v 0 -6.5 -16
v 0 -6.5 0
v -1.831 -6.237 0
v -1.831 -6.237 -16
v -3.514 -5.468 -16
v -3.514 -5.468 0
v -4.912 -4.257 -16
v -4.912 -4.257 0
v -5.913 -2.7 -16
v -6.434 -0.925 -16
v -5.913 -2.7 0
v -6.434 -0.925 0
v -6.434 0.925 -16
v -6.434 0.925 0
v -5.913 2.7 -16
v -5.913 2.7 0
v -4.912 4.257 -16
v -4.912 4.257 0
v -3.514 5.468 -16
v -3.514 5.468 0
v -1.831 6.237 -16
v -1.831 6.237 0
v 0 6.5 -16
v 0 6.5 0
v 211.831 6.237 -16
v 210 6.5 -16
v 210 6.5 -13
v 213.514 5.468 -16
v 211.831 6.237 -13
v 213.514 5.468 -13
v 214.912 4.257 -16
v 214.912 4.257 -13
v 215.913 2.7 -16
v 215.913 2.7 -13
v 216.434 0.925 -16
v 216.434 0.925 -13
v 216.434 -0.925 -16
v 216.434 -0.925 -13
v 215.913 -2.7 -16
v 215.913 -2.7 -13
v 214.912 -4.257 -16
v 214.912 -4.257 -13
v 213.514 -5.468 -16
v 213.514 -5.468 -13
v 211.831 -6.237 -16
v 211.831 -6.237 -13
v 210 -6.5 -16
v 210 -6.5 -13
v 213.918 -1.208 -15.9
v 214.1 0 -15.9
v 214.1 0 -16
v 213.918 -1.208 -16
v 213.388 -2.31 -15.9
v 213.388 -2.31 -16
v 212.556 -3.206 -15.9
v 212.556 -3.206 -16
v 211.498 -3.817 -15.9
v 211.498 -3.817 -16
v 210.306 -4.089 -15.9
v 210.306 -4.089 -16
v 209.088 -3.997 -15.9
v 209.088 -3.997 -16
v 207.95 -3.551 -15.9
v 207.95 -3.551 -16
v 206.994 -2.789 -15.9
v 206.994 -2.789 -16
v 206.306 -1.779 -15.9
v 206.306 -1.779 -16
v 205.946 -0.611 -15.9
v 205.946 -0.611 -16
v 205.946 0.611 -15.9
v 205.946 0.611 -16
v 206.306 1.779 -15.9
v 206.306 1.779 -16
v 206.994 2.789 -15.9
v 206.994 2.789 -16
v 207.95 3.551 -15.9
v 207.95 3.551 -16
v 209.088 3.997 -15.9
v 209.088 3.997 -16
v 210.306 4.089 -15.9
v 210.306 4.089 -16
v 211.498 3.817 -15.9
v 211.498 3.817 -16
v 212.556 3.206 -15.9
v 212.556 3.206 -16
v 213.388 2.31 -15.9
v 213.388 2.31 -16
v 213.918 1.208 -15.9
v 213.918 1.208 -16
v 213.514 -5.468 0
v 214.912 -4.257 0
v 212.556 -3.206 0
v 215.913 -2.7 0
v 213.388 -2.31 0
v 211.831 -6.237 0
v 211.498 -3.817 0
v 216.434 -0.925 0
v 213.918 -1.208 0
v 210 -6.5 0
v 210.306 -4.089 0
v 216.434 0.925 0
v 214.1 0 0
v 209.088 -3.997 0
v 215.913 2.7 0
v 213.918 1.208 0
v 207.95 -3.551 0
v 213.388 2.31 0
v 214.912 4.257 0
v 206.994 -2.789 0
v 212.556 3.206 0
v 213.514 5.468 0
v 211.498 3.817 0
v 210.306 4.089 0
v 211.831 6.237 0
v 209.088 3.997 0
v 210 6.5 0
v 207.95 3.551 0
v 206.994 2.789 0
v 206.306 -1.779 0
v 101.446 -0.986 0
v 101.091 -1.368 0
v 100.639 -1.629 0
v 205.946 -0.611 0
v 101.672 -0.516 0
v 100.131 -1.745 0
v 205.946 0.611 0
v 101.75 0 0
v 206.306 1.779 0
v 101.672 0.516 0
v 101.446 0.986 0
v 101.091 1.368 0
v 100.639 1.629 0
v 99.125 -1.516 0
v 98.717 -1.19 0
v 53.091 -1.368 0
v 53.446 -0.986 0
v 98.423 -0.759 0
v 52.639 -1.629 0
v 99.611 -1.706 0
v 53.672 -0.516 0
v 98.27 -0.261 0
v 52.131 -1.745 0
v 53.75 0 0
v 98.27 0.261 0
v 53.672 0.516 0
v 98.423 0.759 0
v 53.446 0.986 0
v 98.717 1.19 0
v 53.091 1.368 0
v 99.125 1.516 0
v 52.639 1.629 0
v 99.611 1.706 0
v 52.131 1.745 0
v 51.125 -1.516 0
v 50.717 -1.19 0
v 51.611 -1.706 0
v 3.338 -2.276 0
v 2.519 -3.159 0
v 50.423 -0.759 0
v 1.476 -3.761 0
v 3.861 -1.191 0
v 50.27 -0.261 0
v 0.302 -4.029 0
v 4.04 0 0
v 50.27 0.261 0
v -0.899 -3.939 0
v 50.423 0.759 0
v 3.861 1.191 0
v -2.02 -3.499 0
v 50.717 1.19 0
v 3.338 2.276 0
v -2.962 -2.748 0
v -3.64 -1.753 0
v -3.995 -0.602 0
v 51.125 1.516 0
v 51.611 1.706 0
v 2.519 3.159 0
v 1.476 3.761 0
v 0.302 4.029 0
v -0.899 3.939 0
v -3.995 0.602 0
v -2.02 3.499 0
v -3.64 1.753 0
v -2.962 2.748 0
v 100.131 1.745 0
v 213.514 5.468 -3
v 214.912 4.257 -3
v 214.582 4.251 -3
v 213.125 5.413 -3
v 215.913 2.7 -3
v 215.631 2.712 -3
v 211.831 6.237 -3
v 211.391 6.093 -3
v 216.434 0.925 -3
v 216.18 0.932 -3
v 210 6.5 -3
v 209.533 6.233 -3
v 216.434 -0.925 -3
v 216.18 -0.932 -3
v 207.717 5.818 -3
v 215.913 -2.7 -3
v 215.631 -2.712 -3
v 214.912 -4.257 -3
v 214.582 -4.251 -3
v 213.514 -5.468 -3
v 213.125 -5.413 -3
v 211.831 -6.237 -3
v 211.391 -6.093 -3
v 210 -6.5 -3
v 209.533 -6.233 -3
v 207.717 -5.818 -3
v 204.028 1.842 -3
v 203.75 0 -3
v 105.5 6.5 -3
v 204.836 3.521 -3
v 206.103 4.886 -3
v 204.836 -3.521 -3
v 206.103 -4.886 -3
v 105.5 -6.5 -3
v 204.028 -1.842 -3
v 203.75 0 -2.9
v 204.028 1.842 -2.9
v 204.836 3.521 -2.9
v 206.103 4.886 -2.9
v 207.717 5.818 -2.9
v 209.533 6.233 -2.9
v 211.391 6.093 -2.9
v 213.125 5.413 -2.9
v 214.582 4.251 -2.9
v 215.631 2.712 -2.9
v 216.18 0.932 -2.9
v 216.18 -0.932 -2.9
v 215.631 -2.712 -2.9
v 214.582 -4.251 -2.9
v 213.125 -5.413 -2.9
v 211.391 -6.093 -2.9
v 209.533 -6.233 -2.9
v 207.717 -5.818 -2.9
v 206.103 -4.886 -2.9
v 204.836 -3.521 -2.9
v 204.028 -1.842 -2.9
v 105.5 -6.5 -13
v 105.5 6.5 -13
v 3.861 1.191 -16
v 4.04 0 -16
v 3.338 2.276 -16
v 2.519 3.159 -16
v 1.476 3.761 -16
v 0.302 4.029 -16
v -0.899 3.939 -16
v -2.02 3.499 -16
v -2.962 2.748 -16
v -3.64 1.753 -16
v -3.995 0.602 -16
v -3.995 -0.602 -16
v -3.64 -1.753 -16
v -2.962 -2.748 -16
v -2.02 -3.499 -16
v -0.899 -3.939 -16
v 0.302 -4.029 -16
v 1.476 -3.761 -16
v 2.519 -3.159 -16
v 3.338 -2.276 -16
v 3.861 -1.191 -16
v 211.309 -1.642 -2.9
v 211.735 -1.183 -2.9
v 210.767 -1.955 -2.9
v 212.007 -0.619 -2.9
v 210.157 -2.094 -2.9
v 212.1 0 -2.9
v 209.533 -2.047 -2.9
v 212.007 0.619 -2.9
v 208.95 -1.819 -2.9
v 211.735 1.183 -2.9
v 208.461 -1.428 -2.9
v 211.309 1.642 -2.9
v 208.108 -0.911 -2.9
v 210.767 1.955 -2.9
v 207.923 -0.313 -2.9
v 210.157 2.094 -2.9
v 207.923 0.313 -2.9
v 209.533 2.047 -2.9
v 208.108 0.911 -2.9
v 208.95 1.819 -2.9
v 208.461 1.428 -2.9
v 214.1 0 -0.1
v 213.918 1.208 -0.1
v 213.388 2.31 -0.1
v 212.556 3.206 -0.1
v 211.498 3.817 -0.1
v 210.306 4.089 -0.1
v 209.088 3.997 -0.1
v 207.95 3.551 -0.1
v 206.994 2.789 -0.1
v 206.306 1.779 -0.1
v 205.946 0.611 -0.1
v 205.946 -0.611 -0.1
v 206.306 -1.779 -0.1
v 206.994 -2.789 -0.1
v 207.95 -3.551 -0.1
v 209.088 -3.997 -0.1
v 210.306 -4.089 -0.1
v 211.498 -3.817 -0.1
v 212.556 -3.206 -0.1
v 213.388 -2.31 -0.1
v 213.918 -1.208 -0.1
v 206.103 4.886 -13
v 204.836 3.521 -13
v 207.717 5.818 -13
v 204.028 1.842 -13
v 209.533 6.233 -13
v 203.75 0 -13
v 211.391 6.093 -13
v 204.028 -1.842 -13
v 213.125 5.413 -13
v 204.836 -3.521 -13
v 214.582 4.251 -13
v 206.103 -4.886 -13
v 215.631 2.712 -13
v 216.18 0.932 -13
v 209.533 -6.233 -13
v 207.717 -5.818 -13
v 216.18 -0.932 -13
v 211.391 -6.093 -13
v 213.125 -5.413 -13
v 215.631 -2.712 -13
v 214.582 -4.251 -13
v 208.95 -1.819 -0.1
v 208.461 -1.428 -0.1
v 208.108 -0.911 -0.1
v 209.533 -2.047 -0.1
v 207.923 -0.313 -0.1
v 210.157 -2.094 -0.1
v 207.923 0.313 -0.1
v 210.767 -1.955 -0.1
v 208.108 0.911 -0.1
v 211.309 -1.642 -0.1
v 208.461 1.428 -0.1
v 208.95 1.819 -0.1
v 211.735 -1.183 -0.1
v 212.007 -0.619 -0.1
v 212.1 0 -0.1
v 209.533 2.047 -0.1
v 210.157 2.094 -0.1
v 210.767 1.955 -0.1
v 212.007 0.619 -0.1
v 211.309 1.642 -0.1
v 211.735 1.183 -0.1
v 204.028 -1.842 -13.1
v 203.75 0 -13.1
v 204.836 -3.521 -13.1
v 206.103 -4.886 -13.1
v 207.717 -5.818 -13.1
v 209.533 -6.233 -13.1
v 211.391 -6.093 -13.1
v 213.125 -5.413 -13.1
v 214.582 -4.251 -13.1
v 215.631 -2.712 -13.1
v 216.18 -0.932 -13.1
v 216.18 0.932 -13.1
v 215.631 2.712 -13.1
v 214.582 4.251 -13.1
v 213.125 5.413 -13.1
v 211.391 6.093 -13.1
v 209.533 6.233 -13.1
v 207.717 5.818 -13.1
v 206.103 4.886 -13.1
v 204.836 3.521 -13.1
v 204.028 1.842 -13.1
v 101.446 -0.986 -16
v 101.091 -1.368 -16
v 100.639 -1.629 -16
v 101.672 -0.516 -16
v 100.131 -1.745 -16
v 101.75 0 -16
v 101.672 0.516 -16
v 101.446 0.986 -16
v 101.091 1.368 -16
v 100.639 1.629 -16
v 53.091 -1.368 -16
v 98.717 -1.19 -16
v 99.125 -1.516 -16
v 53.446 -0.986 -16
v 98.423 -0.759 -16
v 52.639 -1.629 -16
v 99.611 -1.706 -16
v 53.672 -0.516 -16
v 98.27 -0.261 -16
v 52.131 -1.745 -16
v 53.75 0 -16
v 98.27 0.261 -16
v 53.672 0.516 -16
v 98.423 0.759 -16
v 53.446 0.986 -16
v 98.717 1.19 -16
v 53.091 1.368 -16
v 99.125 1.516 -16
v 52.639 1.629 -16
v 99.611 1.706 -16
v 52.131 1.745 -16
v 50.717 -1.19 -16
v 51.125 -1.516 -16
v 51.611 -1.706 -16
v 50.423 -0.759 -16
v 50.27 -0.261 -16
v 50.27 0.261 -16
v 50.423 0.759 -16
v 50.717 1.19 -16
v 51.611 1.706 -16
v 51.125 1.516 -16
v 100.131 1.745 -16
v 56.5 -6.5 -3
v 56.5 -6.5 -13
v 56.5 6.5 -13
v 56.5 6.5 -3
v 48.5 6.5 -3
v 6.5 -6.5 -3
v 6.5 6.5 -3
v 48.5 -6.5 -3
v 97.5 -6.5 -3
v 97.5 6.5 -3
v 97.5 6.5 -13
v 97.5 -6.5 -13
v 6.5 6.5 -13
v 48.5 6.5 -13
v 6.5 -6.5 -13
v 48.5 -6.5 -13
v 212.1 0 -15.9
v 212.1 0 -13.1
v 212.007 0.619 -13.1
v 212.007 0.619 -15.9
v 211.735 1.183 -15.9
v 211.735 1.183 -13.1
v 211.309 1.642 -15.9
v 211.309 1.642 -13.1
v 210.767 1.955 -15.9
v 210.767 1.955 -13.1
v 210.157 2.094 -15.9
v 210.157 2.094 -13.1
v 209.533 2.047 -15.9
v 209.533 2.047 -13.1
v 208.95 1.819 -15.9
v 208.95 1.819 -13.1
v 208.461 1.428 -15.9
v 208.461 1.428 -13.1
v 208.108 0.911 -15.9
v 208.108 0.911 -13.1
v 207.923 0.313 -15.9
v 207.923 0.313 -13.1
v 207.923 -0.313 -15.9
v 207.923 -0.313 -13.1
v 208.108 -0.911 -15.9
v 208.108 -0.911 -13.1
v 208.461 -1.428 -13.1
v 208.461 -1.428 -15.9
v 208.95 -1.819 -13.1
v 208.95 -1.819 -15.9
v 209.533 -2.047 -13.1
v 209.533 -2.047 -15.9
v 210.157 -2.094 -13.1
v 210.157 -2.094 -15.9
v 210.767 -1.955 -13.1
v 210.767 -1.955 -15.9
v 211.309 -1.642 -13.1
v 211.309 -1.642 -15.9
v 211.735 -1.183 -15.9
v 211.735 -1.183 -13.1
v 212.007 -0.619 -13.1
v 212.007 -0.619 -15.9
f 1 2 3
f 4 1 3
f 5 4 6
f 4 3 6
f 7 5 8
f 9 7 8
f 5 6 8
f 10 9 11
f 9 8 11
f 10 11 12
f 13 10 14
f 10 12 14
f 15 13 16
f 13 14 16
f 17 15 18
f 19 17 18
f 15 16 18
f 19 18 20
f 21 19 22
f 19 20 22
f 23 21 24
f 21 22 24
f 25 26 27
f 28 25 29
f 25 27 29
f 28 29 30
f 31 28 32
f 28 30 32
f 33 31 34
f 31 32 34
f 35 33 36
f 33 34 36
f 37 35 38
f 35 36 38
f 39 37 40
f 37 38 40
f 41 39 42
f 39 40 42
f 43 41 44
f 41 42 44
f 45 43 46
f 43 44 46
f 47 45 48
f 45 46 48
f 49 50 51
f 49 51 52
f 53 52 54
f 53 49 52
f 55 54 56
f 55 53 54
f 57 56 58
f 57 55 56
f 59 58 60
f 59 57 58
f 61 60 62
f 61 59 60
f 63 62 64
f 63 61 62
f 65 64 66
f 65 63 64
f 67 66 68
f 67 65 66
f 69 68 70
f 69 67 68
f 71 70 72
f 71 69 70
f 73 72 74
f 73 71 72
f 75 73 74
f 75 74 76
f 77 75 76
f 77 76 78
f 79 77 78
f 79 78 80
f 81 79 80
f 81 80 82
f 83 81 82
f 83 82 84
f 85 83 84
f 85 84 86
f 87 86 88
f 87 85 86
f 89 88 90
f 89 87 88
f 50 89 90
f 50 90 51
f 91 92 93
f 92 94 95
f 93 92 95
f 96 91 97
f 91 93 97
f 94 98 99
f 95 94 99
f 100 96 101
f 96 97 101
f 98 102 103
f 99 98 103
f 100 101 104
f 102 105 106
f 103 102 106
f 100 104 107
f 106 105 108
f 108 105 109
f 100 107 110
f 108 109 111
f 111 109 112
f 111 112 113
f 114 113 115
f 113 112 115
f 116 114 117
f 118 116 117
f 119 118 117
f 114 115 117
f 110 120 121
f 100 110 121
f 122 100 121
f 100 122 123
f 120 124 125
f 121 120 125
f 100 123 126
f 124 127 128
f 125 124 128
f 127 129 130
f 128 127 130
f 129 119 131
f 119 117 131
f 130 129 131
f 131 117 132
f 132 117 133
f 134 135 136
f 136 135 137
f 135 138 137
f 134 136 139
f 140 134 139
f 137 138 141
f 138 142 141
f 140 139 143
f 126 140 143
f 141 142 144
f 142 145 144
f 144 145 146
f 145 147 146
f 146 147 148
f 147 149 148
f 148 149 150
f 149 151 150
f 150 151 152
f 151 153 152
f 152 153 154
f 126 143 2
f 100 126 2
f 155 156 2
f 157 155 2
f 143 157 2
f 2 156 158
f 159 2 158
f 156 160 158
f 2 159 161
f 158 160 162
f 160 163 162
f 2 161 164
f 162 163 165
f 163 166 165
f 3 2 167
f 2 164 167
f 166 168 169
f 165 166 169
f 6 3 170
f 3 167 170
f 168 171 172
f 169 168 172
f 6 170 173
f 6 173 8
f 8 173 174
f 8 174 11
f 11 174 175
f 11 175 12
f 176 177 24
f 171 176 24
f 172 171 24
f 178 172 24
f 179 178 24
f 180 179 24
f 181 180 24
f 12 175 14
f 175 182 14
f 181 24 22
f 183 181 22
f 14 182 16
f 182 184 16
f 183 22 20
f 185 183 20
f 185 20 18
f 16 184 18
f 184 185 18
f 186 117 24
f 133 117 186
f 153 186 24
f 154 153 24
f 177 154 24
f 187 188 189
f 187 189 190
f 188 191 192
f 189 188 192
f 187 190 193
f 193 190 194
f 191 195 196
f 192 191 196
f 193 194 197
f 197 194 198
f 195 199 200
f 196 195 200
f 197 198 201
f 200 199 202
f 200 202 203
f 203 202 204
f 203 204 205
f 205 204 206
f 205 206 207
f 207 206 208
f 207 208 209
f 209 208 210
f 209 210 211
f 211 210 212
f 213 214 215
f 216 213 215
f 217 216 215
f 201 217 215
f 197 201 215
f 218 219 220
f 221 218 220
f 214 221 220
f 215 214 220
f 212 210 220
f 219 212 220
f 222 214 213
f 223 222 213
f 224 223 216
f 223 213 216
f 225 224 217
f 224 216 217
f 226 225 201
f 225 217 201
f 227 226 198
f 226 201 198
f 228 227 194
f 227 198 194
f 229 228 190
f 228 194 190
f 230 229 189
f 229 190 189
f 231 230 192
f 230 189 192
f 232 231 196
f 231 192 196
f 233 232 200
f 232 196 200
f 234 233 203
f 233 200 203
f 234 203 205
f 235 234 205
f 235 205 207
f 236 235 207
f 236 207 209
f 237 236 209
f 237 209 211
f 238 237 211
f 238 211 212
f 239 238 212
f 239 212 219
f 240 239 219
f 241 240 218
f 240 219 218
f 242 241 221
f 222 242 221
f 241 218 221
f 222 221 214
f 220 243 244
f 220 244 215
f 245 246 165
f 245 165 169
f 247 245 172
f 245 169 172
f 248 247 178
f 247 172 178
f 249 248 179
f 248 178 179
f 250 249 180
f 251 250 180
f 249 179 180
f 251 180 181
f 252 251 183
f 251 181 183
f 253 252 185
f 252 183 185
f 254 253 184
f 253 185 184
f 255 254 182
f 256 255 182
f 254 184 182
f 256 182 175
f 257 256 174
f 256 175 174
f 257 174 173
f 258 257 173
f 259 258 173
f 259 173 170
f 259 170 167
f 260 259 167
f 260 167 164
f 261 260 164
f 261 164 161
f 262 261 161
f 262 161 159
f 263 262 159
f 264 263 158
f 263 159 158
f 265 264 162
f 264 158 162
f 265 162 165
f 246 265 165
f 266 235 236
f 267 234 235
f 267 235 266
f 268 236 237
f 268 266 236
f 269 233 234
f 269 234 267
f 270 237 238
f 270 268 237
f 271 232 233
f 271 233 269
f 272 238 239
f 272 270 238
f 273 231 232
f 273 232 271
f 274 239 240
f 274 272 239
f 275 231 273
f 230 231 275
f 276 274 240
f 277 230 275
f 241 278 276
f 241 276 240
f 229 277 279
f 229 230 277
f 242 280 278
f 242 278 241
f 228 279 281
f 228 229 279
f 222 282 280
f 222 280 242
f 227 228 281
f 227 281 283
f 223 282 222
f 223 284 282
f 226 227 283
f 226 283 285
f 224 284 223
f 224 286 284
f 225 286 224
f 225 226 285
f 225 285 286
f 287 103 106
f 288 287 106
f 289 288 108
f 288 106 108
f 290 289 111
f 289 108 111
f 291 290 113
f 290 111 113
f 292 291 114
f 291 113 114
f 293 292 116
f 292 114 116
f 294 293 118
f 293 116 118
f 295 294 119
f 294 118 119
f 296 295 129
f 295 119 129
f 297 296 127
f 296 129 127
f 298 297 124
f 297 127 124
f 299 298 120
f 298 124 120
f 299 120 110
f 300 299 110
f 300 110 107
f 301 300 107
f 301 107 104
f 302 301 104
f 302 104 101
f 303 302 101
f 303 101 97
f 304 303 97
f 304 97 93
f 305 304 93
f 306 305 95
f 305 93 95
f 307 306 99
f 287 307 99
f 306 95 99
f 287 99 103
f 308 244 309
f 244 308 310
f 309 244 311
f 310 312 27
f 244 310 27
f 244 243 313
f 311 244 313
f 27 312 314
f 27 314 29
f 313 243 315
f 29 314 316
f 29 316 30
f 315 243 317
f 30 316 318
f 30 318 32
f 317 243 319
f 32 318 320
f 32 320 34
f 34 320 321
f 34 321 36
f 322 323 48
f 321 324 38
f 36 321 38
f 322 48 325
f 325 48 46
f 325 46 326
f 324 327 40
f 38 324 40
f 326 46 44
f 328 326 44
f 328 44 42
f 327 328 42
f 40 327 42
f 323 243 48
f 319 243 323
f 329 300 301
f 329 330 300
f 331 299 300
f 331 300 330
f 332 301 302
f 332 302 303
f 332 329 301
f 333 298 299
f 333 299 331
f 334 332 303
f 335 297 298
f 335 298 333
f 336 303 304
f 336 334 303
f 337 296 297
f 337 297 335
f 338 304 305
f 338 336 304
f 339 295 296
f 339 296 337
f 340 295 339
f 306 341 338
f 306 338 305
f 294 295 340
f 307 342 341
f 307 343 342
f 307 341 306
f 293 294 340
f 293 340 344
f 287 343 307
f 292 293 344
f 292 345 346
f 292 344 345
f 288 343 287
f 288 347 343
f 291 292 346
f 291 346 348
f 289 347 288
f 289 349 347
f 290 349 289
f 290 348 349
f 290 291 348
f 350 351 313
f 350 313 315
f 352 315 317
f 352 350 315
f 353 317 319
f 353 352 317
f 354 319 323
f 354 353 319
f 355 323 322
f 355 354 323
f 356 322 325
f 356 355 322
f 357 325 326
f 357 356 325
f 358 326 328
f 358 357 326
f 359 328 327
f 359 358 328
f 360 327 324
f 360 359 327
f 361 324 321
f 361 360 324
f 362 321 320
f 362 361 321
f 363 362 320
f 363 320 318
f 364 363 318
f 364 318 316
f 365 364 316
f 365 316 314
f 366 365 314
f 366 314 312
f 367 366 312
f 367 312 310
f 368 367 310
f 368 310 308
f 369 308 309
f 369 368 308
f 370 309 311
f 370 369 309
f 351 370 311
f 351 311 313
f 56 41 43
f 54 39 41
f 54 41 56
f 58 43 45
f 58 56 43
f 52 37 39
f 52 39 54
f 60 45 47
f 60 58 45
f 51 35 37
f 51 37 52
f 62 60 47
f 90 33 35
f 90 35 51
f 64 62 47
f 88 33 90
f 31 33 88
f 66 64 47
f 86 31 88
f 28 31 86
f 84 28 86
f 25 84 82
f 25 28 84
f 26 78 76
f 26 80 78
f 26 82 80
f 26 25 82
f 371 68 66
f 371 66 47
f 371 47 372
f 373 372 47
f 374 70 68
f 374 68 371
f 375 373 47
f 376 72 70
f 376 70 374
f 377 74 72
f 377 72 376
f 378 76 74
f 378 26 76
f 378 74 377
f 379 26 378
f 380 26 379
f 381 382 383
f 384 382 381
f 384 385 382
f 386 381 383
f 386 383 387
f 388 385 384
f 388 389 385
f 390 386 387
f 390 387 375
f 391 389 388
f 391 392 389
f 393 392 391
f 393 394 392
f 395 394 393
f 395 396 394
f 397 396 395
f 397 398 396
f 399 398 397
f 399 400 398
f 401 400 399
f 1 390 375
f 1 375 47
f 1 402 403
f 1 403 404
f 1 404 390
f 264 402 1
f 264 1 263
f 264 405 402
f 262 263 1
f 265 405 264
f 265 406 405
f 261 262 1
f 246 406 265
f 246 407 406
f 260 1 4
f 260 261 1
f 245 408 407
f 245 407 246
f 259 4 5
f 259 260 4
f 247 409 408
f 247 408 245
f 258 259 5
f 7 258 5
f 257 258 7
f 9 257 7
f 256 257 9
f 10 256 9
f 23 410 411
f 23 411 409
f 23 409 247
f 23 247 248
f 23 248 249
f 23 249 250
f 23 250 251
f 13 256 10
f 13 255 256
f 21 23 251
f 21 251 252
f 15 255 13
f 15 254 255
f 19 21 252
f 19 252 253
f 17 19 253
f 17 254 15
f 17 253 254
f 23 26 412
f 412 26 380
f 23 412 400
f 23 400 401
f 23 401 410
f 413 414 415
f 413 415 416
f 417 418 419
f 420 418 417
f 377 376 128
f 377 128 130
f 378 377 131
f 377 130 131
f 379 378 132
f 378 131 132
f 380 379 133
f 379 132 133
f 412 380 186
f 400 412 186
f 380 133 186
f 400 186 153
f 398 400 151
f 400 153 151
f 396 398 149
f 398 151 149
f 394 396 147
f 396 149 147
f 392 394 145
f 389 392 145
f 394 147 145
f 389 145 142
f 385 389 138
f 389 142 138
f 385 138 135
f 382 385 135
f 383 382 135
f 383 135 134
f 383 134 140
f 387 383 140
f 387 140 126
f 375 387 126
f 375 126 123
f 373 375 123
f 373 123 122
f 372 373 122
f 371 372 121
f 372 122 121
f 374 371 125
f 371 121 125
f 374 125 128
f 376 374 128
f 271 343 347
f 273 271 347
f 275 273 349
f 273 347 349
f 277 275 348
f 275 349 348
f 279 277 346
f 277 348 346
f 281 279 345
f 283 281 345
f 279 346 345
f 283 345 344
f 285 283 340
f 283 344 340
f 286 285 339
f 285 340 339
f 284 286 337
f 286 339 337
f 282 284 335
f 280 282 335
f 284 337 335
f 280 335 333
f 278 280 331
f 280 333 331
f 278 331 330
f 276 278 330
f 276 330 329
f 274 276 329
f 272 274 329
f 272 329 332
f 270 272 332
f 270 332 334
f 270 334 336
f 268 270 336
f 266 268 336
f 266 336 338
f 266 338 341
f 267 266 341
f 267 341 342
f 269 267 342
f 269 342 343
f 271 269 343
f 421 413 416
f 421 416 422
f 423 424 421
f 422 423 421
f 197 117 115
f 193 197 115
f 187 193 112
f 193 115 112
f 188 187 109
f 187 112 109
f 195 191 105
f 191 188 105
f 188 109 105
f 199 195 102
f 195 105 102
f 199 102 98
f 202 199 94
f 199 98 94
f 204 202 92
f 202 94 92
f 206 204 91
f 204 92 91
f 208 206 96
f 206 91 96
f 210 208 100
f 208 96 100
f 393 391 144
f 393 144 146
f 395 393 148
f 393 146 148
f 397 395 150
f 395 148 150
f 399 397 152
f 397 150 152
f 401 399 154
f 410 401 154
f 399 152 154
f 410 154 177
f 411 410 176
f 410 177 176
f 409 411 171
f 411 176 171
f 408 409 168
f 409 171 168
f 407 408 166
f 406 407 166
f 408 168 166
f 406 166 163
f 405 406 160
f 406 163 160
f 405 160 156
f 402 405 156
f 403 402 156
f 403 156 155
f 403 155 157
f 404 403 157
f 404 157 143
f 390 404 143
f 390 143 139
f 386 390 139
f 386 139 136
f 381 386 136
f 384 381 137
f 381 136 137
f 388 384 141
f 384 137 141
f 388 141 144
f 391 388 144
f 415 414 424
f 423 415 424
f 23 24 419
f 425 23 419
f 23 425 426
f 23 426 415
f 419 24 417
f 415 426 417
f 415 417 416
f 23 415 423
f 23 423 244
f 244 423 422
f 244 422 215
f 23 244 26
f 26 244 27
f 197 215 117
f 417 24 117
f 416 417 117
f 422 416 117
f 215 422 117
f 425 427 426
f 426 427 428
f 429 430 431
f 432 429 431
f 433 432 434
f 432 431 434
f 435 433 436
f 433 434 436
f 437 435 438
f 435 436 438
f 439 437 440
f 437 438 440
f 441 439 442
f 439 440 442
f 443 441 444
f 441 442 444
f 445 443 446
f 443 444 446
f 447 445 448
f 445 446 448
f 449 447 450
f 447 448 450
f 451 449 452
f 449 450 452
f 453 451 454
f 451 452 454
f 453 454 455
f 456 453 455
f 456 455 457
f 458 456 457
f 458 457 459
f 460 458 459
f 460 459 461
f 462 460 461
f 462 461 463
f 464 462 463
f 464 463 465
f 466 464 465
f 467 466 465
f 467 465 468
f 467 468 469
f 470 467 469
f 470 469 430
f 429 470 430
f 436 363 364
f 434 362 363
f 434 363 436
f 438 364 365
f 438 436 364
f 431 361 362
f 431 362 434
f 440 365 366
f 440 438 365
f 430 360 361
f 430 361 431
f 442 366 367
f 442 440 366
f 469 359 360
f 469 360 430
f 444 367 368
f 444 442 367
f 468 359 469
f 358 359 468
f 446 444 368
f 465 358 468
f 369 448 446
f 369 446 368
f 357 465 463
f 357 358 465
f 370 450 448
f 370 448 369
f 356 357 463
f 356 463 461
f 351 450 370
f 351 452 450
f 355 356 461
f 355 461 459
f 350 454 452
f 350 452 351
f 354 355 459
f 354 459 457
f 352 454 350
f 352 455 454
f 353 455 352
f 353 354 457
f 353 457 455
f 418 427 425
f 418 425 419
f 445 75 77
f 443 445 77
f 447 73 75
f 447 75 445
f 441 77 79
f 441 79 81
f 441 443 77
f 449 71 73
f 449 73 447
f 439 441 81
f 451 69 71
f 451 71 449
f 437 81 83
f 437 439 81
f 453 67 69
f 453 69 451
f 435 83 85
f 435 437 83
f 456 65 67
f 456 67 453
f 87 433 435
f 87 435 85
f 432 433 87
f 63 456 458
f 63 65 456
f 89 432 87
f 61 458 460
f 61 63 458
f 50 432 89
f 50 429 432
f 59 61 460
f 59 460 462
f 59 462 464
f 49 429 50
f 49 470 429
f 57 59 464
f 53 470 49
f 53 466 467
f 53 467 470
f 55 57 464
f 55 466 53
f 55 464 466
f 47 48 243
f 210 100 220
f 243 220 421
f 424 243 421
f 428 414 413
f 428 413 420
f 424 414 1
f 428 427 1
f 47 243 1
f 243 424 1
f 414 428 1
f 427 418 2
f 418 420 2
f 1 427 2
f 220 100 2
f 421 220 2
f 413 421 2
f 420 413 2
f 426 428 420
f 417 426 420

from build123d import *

# Parameters (mm, degrees)
SKETCH_1_R          = 4.04
SKETCH_1_R_2        = 1.75
SKETCH_1_R_3        = 2.1
EXTRUDE_1_DEPTH     = 16
SKETCH_2_W          = 42
SKETCH_2_H          = 10
SKETCH_2_W_2        = 41
CUT_EXTRUDE_1_DEPTH = 218.479309361
SKETCH_3_R          = 4.1
A_0P1_DEPTH         = 0.1
B_0P1_START         = -0.1
SKETCH_4_R          = 4.1
B_0P1_DEPTH         = 0.1
SKETCH_5_R          = 6.25
A_0P1_2_DEPTH       = 0.1
SKETCH_6_R          = 6.25
B_0P1_2_DEPTH       = 0.1


with BuildPart() as part:
    # 草图1 → 凸台-拉伸1 (new body)
    with BuildSketch(Plane.XY):
        with BuildLine():
            Line((0, 6.5), (210, 6.5))
            ThreePointArc((210, 6.5), (216.5, 0), (210, -6.5))
            Line((210, -6.5), (0, -6.5))
            ThreePointArc((0, -6.5), (-6.5, 0), (0, 6.5))
        make_face()
        Circle(SKETCH_1_R, mode=Mode.SUBTRACT)
        with Locations((100, 0)):
            Circle(SKETCH_1_R_2, mode=Mode.SUBTRACT)
        with Locations((210, 0)):
            Circle(SKETCH_1_R_3, mode=Mode.SUBTRACT)
        with Locations((52, 0)):
            Circle(SKETCH_1_R_2, mode=Mode.SUBTRACT)
    extrude(amount=-EXTRUDE_1_DEPTH)

    # 草图2 → 切除-拉伸1 (cut, through all)
    with BuildSketch(Plane.XZ.offset(6.5)):
        Polygon((148.5, -3), (153.5, -3), (216.5, -3), (216.5, -13), (153.5, -13), (148.5, -13), (105.5, -13), (105.5, -3), align=None)
        with Locations((27.5, -8)):
            Rectangle(SKETCH_2_W, SKETCH_2_H)
        with Locations((77, -8)):
            Rectangle(SKETCH_2_W_2, SKETCH_2_H)
    extrude(amount=-CUT_EXTRUDE_1_DEPTH, mode=Mode.SUBTRACT)

    # 草图3 → A__0p1 (cut)
    with BuildSketch(Plane.XY):
        with Locations((210, 0)):
            Circle(SKETCH_3_R)
    extrude(amount=-A_0P1_DEPTH, mode=Mode.SUBTRACT)

    # 草图4 → B__0p1 (cut)
    with BuildSketch(Plane(origin=(0, 0, -16), x_dir=(-1, 0, 0), z_dir=(0, 0, -1)).offset(B_0P1_START)):
        with Locations(Location((-210, 0, 0), (0, 0, 180))):
            Circle(SKETCH_4_R)
    extrude(amount=B_0P1_DEPTH, mode=Mode.SUBTRACT)

    # 草图5 → A__0p1 2 (cut)
    with BuildSketch(Plane(origin=(0, 0, -3), x_dir=(-1, 0, 0), z_dir=(0, 0, -1))):
        with Locations((-210, 0)):
            Circle(SKETCH_5_R)
    extrude(amount=-A_0P1_2_DEPTH, mode=Mode.SUBTRACT)

    # 草图6 → B__0p1 2 (cut)
    with BuildSketch(Plane.XY.offset(-13).offset(B_0P1_START)):
        with Locations(Location((210, 0, 0), (0, 0, 180))):
            Circle(SKETCH_6_R)
    extrude(amount=B_0P1_2_DEPTH, mode=Mode.SUBTRACT)


solid = part.part
